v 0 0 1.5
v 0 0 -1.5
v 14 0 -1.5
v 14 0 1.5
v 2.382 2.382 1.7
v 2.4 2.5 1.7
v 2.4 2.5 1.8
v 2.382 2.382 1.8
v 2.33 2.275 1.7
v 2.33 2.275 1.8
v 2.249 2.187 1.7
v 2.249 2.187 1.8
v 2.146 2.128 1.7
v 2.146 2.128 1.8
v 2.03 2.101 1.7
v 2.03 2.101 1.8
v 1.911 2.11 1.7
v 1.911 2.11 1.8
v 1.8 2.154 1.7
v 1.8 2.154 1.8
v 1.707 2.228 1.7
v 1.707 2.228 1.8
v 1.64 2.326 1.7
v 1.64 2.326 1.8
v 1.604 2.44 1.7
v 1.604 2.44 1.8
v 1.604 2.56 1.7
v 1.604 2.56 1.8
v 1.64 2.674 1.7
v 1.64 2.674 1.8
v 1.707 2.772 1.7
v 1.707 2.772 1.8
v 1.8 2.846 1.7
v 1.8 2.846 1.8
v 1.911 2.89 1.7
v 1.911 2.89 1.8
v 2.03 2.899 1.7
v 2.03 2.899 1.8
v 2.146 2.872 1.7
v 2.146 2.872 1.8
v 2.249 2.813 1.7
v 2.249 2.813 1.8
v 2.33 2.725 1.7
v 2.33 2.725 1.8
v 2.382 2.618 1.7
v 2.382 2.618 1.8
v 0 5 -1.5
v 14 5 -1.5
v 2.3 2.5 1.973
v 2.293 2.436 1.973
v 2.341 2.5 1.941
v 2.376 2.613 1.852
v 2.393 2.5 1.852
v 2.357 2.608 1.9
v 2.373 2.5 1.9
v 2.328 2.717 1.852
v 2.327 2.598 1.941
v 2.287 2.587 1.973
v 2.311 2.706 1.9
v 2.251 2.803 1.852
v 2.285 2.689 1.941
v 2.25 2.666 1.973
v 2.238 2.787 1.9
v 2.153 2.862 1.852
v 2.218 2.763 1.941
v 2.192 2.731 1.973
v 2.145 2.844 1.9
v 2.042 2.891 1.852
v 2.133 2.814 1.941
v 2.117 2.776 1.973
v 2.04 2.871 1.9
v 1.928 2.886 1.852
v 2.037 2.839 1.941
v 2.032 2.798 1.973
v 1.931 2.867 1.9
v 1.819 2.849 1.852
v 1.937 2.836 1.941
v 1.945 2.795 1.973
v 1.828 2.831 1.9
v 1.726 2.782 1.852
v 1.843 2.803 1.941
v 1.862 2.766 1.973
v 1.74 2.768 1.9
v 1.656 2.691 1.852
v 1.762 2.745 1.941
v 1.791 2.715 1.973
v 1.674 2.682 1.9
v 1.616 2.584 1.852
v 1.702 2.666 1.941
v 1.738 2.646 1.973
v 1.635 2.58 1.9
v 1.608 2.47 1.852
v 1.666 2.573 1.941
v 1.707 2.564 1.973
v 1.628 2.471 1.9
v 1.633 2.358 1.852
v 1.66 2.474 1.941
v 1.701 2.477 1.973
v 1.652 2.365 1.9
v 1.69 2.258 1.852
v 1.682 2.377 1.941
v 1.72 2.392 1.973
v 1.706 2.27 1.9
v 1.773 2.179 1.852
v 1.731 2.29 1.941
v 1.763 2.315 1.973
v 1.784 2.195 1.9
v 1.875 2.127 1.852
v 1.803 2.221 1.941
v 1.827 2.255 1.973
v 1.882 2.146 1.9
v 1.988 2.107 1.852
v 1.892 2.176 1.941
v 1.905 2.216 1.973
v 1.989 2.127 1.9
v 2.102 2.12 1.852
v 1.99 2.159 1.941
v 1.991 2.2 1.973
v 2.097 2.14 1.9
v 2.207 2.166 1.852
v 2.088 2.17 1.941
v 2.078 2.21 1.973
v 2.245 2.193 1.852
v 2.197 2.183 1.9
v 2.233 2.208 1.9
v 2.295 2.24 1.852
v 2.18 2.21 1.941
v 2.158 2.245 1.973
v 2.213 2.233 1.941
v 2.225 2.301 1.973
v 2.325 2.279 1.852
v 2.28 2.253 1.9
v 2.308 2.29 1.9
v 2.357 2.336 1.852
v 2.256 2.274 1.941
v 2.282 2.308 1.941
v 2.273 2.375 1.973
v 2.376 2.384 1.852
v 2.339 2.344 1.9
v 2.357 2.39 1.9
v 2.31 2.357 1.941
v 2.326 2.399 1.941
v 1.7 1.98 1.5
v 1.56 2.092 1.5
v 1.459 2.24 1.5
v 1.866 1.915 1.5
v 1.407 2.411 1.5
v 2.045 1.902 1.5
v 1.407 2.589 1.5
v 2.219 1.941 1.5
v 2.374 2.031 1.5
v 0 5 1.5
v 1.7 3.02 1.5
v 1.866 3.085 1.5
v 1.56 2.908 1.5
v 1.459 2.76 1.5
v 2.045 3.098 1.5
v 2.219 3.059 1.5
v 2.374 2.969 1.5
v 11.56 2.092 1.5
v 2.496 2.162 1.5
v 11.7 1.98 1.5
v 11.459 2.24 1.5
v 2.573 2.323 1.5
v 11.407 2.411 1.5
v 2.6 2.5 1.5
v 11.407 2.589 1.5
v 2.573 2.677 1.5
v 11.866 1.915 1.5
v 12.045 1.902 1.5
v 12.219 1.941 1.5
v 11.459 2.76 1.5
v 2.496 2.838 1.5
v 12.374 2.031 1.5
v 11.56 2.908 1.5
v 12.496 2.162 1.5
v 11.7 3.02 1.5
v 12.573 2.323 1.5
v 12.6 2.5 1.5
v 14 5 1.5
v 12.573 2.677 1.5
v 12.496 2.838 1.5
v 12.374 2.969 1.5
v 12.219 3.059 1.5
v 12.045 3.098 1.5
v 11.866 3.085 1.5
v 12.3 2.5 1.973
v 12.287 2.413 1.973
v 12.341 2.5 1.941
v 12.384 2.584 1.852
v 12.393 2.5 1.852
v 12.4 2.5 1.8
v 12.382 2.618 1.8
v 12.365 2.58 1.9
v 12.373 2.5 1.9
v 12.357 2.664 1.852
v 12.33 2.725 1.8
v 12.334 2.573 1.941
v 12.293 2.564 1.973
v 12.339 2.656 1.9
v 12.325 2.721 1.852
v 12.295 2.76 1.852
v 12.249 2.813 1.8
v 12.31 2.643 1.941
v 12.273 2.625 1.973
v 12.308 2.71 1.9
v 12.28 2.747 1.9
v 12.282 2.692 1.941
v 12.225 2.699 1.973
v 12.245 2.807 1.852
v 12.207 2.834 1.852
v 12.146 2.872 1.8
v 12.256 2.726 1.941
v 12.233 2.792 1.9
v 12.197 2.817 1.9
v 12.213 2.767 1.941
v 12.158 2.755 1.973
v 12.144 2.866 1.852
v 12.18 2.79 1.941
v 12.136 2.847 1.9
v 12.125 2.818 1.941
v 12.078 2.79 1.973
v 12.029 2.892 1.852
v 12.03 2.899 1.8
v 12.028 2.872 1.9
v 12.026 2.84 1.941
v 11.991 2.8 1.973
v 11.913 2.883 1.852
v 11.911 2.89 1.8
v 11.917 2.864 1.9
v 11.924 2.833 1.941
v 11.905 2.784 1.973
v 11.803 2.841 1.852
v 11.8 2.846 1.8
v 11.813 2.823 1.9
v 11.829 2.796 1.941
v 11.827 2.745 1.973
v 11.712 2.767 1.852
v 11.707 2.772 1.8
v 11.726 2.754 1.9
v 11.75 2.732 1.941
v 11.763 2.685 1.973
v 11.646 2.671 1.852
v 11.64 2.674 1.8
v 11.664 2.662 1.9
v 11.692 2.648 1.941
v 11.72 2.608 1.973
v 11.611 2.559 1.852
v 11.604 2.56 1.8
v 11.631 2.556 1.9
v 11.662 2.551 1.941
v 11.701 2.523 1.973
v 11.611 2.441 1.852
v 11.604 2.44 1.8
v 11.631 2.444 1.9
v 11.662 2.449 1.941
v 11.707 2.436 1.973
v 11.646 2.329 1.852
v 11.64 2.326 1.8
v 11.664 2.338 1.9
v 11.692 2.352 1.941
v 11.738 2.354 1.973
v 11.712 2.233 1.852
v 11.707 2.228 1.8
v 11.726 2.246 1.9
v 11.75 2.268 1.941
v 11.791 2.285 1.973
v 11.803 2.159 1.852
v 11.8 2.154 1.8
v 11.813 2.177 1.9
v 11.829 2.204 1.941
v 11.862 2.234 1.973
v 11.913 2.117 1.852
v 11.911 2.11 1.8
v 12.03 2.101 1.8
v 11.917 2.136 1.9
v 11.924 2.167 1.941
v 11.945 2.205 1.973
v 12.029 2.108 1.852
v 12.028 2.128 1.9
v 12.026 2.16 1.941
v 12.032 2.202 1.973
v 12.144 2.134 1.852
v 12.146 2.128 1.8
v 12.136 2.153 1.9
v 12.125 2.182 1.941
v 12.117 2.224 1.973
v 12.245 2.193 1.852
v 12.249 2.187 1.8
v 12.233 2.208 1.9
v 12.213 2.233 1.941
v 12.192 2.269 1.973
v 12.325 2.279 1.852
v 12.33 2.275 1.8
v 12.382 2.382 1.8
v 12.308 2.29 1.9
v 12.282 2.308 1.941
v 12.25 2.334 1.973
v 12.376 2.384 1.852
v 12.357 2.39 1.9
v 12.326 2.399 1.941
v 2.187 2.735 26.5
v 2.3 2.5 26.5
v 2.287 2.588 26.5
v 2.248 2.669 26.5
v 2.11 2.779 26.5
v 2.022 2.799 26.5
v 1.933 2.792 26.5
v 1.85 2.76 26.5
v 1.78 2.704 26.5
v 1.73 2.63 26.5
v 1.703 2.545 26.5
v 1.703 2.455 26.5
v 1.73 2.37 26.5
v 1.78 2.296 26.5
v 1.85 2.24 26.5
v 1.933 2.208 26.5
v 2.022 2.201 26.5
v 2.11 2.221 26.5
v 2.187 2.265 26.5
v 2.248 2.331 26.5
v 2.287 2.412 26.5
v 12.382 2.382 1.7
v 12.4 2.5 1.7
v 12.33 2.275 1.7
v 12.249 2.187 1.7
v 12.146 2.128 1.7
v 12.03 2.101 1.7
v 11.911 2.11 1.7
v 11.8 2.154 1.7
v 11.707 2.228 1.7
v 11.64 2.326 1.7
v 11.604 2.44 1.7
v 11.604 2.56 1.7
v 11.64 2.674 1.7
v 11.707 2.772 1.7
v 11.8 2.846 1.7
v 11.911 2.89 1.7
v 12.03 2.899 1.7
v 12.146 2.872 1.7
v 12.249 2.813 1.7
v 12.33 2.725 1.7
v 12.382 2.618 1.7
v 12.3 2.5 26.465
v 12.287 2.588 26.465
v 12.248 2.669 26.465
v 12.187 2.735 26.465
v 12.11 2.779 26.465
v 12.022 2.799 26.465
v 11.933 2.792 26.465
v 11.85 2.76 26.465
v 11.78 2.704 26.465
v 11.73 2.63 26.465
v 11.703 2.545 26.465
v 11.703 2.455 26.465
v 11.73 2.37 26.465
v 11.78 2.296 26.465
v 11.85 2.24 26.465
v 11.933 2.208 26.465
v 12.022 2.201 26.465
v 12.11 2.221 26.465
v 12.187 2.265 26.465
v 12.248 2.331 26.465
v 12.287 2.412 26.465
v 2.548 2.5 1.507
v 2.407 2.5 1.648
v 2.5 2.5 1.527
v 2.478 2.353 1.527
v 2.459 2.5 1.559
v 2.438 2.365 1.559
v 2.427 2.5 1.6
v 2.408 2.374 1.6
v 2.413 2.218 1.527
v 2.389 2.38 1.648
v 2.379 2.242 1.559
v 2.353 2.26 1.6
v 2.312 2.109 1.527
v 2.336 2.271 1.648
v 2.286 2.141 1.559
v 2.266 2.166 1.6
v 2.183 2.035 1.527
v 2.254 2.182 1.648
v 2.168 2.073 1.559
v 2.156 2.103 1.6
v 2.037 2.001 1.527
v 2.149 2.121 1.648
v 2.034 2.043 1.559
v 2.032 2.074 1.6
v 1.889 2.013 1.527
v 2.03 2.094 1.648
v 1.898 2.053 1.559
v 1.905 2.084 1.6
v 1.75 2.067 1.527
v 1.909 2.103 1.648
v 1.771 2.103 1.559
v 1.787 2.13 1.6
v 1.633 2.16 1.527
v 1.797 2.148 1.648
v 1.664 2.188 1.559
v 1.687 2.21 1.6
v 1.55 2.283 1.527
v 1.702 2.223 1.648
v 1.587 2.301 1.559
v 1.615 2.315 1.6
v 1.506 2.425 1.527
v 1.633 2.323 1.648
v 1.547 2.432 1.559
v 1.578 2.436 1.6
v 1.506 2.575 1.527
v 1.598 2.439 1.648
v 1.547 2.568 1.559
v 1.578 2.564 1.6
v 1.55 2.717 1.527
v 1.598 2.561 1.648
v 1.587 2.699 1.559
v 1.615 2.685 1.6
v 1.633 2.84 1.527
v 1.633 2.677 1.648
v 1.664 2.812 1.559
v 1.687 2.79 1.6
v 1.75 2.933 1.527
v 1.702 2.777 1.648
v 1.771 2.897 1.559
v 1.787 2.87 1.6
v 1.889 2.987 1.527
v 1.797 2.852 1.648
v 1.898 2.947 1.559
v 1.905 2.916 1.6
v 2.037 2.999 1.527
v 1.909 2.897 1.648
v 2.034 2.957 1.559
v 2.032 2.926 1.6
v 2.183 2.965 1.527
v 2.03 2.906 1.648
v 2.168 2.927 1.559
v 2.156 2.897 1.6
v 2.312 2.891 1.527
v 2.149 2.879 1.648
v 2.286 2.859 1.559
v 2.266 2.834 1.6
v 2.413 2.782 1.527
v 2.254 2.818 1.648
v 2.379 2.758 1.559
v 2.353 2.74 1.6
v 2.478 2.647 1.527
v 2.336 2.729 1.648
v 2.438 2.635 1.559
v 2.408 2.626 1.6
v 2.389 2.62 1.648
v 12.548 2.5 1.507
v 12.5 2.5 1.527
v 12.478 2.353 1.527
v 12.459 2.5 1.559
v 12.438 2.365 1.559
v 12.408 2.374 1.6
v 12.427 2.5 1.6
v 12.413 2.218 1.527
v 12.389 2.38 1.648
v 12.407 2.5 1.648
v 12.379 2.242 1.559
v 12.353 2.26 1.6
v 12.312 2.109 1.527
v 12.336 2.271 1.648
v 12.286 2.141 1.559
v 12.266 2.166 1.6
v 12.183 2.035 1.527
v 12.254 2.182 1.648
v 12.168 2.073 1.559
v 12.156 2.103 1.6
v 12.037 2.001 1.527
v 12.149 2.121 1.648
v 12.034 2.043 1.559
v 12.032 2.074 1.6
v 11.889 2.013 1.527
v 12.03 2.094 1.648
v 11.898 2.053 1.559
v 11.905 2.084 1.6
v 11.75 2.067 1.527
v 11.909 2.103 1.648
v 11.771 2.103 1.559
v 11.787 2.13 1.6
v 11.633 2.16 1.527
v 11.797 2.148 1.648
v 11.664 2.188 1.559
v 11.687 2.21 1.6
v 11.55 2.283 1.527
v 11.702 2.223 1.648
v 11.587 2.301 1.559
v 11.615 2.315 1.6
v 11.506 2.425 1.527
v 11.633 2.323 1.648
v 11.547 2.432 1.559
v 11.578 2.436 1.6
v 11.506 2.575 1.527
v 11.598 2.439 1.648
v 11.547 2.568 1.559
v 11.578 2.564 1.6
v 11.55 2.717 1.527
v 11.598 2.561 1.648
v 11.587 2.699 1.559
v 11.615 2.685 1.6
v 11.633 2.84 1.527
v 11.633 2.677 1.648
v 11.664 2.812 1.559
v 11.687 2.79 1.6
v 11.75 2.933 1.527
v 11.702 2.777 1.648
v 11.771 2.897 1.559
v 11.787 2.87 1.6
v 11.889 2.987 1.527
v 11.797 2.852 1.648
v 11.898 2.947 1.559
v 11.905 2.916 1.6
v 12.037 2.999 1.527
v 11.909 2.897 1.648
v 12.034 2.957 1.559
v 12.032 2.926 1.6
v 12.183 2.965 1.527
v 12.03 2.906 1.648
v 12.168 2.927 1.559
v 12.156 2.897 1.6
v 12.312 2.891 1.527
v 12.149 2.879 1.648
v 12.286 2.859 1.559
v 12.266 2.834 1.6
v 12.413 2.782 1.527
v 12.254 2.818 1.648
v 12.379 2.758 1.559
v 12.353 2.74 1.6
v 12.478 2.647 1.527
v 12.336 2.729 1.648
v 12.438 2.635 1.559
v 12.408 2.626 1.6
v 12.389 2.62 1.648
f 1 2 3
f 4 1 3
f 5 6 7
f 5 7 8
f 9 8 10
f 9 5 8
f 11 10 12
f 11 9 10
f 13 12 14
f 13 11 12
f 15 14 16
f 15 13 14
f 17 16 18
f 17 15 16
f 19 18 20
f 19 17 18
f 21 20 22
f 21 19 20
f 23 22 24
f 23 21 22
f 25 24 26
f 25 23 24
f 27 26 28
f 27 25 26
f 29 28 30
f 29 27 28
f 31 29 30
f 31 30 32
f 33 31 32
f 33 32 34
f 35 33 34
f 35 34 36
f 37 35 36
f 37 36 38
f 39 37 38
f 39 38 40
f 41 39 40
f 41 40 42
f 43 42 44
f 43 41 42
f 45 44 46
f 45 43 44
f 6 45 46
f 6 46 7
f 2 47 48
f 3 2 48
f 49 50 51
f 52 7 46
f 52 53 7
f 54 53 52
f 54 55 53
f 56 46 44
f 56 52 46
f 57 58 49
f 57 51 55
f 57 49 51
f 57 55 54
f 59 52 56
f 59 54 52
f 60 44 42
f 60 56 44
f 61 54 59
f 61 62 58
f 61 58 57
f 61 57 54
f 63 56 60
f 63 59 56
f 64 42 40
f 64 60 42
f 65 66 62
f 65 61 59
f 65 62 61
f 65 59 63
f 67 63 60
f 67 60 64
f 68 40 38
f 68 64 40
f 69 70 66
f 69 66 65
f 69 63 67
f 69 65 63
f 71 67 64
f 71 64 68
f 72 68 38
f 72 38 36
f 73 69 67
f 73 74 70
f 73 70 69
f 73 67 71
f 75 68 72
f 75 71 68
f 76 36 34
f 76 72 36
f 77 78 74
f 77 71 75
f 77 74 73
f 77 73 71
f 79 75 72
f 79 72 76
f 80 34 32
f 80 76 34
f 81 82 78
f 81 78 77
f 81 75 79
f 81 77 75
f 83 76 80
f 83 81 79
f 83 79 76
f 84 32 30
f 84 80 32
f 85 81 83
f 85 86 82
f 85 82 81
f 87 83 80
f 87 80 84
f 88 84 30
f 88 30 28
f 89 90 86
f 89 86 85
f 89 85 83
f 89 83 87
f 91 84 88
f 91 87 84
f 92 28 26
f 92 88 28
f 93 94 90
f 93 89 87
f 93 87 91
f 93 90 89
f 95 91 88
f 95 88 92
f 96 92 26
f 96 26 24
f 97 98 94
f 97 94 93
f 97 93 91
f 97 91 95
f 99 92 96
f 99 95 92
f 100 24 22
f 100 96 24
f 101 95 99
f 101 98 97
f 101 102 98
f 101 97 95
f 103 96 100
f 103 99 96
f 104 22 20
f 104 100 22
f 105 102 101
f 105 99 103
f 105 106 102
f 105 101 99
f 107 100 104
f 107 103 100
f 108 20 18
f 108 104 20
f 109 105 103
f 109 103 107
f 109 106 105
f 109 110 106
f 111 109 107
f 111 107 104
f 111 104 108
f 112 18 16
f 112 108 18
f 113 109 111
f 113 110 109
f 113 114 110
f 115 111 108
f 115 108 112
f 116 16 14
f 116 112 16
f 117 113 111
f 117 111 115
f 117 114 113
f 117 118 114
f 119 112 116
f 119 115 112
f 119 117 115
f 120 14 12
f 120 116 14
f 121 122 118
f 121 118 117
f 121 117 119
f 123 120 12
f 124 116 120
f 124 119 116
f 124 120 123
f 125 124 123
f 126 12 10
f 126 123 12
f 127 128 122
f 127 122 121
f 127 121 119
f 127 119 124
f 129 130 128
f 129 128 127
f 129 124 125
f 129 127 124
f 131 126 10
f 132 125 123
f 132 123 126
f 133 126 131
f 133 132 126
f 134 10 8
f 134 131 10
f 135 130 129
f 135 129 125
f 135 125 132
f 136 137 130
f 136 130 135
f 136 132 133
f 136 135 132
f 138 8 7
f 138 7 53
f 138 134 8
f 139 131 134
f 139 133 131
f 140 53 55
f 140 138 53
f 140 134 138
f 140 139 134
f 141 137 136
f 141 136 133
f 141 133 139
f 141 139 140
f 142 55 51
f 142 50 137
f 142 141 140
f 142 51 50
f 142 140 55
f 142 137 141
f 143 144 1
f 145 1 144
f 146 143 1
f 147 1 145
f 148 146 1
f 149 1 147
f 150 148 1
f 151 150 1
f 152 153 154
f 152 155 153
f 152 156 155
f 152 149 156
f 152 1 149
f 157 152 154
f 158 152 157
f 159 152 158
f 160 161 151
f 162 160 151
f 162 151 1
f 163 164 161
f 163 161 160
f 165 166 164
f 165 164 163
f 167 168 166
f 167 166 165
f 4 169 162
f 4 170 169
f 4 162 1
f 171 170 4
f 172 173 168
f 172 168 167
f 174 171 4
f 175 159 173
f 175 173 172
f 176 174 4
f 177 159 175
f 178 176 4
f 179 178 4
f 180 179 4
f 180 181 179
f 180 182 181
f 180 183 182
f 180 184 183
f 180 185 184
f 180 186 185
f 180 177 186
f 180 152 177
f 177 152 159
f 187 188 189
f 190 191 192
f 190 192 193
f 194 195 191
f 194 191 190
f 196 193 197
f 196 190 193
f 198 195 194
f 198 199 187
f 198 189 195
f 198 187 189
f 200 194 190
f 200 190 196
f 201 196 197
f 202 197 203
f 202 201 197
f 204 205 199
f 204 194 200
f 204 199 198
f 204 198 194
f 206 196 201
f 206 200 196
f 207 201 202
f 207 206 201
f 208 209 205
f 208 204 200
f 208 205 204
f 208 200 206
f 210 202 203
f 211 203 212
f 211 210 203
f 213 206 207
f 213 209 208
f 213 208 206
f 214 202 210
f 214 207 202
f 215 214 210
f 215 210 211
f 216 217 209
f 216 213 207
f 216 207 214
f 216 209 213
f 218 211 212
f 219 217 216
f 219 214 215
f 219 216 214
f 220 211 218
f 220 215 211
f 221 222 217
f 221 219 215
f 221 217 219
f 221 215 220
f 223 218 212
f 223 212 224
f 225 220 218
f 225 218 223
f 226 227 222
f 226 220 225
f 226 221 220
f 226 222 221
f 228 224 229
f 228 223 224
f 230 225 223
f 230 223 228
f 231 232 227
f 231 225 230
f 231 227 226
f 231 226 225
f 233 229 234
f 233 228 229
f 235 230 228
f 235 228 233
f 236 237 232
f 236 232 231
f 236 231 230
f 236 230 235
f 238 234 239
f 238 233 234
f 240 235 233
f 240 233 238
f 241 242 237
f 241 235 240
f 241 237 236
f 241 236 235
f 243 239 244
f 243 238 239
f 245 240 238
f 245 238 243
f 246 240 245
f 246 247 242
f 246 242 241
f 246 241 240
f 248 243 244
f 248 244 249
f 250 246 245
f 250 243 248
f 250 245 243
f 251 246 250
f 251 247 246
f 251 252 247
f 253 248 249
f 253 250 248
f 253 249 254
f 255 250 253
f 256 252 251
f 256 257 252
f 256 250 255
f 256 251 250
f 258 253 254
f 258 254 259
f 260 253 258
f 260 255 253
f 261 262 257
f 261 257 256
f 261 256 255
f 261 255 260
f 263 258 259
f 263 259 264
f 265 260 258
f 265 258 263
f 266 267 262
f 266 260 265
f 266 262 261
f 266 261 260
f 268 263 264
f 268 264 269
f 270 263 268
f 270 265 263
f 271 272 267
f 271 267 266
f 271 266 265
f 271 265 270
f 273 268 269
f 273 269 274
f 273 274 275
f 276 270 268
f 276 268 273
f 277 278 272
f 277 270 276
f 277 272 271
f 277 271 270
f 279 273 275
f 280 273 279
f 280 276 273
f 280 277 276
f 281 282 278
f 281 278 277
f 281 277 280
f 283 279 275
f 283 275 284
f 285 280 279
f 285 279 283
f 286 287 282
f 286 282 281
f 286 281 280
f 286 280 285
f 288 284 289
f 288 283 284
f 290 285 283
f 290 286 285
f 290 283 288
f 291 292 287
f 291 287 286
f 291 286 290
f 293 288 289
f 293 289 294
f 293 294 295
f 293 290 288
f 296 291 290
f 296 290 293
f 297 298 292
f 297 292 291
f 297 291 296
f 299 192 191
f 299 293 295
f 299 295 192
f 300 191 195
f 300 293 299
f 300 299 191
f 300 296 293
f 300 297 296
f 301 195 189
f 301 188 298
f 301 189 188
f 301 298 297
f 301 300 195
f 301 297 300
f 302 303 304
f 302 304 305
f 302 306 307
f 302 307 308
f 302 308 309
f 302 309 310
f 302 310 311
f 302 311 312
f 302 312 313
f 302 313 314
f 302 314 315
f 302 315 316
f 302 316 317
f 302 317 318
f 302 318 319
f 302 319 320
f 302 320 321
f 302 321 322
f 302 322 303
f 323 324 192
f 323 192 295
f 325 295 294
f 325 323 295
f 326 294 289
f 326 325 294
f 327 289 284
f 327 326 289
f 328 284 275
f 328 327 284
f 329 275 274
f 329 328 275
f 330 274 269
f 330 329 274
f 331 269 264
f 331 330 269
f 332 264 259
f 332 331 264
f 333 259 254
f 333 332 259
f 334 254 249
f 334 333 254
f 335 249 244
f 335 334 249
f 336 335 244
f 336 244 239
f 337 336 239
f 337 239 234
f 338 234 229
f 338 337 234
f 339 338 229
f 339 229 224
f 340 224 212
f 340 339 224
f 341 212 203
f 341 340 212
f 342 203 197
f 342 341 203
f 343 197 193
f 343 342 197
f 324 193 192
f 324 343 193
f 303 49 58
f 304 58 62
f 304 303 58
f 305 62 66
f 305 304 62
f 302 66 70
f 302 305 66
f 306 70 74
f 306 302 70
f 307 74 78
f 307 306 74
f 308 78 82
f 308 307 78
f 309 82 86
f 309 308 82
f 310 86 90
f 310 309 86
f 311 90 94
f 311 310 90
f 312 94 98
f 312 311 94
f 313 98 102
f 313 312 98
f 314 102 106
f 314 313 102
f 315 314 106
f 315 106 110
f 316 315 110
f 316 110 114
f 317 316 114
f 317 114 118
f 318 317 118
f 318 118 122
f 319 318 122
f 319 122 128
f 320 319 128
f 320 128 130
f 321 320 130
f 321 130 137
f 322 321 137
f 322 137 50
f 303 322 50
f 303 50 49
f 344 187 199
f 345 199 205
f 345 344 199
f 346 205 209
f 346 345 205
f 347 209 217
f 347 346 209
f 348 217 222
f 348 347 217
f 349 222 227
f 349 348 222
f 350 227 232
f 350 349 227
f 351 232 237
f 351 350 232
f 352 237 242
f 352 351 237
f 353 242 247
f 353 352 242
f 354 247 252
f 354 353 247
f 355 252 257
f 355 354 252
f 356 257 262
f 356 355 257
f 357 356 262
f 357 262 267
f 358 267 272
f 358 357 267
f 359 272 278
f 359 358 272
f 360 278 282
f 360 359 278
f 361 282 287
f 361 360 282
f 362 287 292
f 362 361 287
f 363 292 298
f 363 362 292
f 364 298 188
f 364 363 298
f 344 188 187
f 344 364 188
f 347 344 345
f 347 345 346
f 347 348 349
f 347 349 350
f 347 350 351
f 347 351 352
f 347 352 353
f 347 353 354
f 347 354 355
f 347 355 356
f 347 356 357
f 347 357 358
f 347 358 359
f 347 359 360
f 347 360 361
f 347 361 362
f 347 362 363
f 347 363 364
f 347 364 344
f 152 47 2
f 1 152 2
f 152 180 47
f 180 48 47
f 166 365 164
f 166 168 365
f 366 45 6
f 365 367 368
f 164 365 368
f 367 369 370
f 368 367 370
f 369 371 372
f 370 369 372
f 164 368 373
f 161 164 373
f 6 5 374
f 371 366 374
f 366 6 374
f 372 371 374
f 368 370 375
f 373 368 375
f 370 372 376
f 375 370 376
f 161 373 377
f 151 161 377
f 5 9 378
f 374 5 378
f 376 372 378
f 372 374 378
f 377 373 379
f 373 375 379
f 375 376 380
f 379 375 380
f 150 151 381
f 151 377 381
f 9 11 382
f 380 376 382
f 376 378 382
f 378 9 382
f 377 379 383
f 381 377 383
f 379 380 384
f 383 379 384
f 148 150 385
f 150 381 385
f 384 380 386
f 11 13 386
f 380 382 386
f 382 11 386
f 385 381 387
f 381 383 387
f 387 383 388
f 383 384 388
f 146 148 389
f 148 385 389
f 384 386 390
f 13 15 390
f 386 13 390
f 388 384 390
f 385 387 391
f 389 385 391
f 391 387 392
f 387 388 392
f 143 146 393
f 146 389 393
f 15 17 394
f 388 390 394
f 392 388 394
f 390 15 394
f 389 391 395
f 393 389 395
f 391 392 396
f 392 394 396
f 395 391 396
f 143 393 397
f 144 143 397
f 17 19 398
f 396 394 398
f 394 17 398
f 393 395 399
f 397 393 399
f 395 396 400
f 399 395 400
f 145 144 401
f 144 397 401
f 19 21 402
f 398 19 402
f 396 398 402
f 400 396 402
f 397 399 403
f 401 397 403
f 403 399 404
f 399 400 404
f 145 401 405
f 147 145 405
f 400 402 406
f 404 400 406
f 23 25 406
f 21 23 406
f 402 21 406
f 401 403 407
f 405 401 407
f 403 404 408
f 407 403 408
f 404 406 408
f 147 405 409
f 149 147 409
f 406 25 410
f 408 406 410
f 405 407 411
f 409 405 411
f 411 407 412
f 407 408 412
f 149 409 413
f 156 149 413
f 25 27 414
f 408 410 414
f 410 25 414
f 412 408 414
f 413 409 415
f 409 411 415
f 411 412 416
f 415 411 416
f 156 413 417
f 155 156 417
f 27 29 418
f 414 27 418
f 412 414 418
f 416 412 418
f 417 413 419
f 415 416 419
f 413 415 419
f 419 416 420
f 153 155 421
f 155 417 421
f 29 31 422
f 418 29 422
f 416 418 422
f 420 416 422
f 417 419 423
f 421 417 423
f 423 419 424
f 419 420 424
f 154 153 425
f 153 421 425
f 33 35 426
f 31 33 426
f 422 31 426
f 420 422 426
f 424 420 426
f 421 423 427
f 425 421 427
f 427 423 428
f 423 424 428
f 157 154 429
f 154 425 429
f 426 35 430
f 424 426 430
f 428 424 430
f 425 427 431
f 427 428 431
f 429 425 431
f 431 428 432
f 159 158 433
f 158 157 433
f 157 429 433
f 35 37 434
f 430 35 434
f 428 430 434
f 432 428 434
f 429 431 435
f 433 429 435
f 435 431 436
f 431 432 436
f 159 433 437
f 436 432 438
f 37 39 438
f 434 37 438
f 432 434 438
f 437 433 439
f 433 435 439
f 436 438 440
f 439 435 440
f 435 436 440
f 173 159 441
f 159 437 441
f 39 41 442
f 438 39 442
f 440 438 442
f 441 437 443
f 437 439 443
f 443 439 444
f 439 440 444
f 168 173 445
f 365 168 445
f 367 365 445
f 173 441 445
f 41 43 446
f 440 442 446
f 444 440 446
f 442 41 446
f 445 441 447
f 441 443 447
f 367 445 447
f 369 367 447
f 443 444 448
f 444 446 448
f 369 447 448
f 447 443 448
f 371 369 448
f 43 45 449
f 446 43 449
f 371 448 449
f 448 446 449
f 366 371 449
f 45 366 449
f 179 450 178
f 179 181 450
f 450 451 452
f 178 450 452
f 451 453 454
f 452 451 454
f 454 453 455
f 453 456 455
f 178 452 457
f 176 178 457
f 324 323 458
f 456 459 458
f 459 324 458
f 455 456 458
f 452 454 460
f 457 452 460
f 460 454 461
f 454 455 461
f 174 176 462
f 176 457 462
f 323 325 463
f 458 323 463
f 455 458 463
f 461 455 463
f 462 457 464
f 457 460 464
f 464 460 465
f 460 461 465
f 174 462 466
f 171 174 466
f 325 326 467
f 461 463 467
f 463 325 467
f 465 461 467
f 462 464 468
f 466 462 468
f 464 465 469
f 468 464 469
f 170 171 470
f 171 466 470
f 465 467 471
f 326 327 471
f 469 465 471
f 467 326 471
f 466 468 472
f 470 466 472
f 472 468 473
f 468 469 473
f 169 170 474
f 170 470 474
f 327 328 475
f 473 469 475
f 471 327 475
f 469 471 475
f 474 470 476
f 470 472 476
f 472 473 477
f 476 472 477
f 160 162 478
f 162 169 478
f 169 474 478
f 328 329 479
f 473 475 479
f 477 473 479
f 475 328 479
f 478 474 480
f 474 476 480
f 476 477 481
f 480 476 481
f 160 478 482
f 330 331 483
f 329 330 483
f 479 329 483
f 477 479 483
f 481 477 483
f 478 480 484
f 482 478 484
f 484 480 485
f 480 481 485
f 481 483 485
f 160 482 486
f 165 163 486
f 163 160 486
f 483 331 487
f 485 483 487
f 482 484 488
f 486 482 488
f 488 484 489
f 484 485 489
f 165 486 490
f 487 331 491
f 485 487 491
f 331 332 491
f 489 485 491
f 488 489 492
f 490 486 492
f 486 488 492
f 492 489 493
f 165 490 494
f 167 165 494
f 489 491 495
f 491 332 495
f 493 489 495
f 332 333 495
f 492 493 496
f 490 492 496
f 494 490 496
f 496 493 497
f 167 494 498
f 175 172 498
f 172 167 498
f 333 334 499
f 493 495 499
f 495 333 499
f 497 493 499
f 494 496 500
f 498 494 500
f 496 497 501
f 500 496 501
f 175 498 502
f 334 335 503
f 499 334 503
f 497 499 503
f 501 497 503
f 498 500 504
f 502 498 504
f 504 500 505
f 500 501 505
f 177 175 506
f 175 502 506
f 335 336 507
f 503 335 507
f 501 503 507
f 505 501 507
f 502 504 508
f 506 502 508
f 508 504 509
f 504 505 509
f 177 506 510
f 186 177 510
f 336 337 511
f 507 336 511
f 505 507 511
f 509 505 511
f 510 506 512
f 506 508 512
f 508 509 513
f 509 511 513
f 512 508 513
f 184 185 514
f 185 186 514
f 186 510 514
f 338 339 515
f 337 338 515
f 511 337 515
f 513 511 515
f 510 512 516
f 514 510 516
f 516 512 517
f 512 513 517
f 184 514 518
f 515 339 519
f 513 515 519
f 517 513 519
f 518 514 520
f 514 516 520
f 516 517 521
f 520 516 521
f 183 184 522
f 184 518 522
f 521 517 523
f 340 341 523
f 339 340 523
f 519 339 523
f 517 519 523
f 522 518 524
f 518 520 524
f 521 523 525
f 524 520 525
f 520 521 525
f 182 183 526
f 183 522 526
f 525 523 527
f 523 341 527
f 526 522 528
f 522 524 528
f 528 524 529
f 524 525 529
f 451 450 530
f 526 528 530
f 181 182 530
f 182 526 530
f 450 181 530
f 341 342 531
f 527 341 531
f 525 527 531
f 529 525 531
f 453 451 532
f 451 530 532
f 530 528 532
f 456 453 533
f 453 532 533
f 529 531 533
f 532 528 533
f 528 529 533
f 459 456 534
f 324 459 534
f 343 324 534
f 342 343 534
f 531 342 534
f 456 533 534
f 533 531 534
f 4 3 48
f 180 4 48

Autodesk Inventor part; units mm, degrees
ref_plane "YZ Plane" through (0, 0, 0) normal (1, 0, 0) x (0, 1, 0)
ref_plane "XZ Plane" through (0, 0, 0) normal (0, 1, 0) x (-1, 0, 0)
ref_plane "XY Plane" through (0, 0, 0) normal (0, 0, 1) x (1, 0, 0)
sketch "Sketch1" plane through (0, 0, 0) normal (0, 0, 1) x (1, 0, 0)
  line L0 (0, 0) -> (14, 0)
  line L1 (14, 0) -> (14, 5)
  line L2 (14, 5) -> (0, 5)
  line L3 (0, 5) -> (0, 0)
  dimension "d39" = 14
  dimension "d40" = 5
extrude "Extrusion1" add sketch "Sketch1" along normal mid plane 3
ref_plane "Work Plane5" through (0, 0, 1.5) normal (0, 0, 1) x (1, 0, 0)
sketch "Sketch9" plane through (0, 0, 1.5) normal (0, 0, 1) x (1, 0, 0)
  line L0 (0, 5) -> (0, 0) projected
  line L1 (0, 2.5) -> (2, 2.5)
  line L2 (14, 0) -> (14, 5) projected
  line L3 (14, 2.5) -> (12, 2.5)
  circle A0 centre (12, 2.5) radius 0.4
  circle A1 centre (2, 2.5) radius 0.4
  dimension "d43" = 2
  dimension "d44" = 2
  dimension "d45" = 0.8
  dimension "d46" = 0.8
extrude "Extrusion5" add sketch "Sketch9" along normal blind 0.5
fillet "Fillet5" radius 0.2 4 edges at (11.6, 2.5, 1.5) (11.6, 2.5, 2) (1.6, 2.5, 1.5) (1.6, 2.5, 2)
sketch "Sketch10" plane through (14, 0, 1.5) normal (1, 0, 0) x (0, 0, -1)
  line L0 (3, 5) -> (3, 0) projected
  line L1 (3, 2.5) -> (0, 2.5)
  line L2 (0, 0) -> (0, 5) projected
  point P0 (1.5, 0)
sketch "Sketch11" plane through (0, 0, 1.5) normal (0, 0, 1) x (1, 0, 0)
  line L0 (14, 0) -> (14, 5) projected
  circle A0 centre (12, 2.5) radius 0.2 projected
  line L1 (7.4995, 2.5) -> (3.1588, 2.5)
  point P0 (0, 0)
sketch "Sketch12" plane through (0, 0, 1.5) normal (-1, 0, 0) x (0, 0, 1)
  line L0 (-3, 5) -> (-3, 0) projected
  line L1 (-3, 2.5) -> (0, 2.5)
  line L2 (0, 1.9) -> (0, 3.1) projected
  point P0 (-1.5, 0)
sketch "Sketch13" plane through (0, 0, 1.5) normal (0, 0, 1) x (1, 0, 0)
  line L0 (0, 5) -> (0, 0) projected
  point P0 (0, 2.5)
ref_plane "Work Plane7" through (2, 2.5, 2) normal (0, 0, 1) x (1, 0, 0)
ref_plane "Work Plane8" through (12, 2.5, 2) normal (0, 0, 1) x (1, 0, 0)
sketch "Sketch15" plane through (2, 2.5, 2) normal (0, 0, 1) x (1, 0, 0)
  circle A0 centre (0, 0) radius 0.2 projected
  circle A1 centre (0, 0) radius 0.3
  point P0 (-2, -2.5)
  dimension "d57" = 0.6
sketch "Sketch17" plane through (12, 2.5, 2) normal (0, 0, 1) x (1, 0, 0)
  circle A0 centre (0, 0) radius 0.3
  point P0 (-12, -2.5)
  dimension "d63" = 0.6
ref_plane "Work Plane9" through (0, 2.5, -1.5) normal (0, -1, 0) x (0, 0, 1)
sketch "Sketch18" plane through (0, 2.5, -1.5) normal (0, -1, 0) x (0, 0, 1)
  line L0 (3, -2) -> (28, -2)
  line L1 (2.9646, -12) -> (27.9646, -12)
  point P0 (1.5, 0)
  point P1 (3, 0)
  dimension "d66" = 2
  dimension "d67" = 25
  dimension "d69" = 25
sweep "Sweep6" add profiles "Sketch15" path "Sketch18" path curves L0 contours A0 | A1
sweep "Sweep7" add profiles "Sketch17" path "Sketch18" path curves L1
equation "\"BendRadius\" = Thickness"
equation "\"BendReliefWidth\" = Thickness"
equation "\"BendReliefDepth\" = 0.5 * Thickness"
equation "\"CornerReliefSize\" = 4 * Thickness"
equation "\"MinimumRemnant\" = 2 * Thickness"
equation "\"TransitionRadius\" = BendRadius"
equation "\"JacobiRadiusSize\" = BendRadius"
equation "\"GapSize\" = Thickness"
equation "\"Thickness\" = 3.048"
properties part number "A54"
